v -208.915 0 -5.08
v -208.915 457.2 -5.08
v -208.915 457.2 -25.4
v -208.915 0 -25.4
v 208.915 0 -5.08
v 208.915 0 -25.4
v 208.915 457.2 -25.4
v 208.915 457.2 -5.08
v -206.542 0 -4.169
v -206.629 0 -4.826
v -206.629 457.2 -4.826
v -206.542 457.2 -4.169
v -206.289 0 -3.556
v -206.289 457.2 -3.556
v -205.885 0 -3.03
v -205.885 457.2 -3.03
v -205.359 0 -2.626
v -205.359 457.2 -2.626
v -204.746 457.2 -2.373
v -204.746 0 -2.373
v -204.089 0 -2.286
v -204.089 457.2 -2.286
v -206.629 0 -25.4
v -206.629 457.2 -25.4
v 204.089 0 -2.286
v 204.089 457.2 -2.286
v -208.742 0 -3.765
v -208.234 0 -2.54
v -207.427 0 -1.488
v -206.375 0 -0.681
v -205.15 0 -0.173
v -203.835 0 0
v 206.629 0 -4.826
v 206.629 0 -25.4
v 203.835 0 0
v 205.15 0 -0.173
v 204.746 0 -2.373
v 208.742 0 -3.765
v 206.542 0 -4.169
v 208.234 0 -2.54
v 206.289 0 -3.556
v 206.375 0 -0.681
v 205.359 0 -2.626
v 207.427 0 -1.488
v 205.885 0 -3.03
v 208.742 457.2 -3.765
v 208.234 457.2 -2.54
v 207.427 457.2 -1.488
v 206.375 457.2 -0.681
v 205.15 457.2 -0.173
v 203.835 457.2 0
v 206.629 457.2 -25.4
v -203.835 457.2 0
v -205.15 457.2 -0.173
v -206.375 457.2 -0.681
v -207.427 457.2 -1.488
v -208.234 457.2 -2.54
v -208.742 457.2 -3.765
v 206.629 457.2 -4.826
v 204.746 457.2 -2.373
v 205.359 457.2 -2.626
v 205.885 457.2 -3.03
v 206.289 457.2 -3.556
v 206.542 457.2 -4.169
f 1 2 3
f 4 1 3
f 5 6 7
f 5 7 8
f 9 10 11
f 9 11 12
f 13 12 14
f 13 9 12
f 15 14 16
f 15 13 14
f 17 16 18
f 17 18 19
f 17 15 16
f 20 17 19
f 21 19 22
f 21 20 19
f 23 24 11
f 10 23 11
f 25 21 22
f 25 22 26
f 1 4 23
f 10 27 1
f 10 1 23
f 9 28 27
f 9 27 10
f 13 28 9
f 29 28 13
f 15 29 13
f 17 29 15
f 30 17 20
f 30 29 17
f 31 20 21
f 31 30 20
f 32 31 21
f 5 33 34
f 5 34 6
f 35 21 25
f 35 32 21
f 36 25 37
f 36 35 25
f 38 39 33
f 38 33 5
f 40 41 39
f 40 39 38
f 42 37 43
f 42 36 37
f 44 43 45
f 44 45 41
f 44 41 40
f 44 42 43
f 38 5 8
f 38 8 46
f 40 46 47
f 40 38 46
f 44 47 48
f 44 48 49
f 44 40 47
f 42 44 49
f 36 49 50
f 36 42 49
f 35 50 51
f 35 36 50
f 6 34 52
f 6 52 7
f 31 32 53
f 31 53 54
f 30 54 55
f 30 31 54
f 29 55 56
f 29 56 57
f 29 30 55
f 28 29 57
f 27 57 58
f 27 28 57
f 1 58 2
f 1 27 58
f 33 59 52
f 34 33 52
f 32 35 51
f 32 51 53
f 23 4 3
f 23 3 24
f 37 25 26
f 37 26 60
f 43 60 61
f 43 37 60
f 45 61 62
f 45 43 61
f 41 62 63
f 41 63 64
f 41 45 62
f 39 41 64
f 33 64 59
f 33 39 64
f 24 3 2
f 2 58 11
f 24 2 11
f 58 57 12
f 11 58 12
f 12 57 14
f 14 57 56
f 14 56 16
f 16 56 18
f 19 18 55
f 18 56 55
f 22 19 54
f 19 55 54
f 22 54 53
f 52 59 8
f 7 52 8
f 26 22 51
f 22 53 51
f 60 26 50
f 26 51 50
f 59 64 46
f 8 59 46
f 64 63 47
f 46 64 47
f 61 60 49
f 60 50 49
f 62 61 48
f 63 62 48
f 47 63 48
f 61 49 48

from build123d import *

# Parameters (mm, degrees)
F1_DEPTH = 457.2


with BuildPart() as f1:
    # F0 (on Front) → F1 (new body)
    with BuildSketch(Plane.XZ):
        with BuildLine():
            Line((203.835, 0), (-203.835, 0))
            ThreePointArc((-203.835, 0), (-207.427102, -1.487898), (-208.915, -5.08))
            Line((-208.915, -5.08), (-208.915, -25.4))
            Line((-208.915, -25.4), (-206.629, -25.4))
            Line((-206.629, -25.4), (-206.629, -4.826))
            ThreePointArc((-206.629, -4.826), (-205.885051, -3.029949), (-204.089, -2.286))
            Line((-204.089, -2.286), (204.089, -2.286))
            ThreePointArc((204.089, -2.286), (205.885051, -3.029949), (206.629, -4.826))
            Line((206.629, -4.826), (206.629, -25.4))
            Line((206.629, -25.4), (208.915, -25.4))
            Line((208.915, -25.4), (208.915, -5.08))
            ThreePointArc((208.915, -5.08), (207.427102, -1.487898), (203.835, 0))
        make_face()
    extrude(amount=-F1_DEPTH)


solid = f1.part
